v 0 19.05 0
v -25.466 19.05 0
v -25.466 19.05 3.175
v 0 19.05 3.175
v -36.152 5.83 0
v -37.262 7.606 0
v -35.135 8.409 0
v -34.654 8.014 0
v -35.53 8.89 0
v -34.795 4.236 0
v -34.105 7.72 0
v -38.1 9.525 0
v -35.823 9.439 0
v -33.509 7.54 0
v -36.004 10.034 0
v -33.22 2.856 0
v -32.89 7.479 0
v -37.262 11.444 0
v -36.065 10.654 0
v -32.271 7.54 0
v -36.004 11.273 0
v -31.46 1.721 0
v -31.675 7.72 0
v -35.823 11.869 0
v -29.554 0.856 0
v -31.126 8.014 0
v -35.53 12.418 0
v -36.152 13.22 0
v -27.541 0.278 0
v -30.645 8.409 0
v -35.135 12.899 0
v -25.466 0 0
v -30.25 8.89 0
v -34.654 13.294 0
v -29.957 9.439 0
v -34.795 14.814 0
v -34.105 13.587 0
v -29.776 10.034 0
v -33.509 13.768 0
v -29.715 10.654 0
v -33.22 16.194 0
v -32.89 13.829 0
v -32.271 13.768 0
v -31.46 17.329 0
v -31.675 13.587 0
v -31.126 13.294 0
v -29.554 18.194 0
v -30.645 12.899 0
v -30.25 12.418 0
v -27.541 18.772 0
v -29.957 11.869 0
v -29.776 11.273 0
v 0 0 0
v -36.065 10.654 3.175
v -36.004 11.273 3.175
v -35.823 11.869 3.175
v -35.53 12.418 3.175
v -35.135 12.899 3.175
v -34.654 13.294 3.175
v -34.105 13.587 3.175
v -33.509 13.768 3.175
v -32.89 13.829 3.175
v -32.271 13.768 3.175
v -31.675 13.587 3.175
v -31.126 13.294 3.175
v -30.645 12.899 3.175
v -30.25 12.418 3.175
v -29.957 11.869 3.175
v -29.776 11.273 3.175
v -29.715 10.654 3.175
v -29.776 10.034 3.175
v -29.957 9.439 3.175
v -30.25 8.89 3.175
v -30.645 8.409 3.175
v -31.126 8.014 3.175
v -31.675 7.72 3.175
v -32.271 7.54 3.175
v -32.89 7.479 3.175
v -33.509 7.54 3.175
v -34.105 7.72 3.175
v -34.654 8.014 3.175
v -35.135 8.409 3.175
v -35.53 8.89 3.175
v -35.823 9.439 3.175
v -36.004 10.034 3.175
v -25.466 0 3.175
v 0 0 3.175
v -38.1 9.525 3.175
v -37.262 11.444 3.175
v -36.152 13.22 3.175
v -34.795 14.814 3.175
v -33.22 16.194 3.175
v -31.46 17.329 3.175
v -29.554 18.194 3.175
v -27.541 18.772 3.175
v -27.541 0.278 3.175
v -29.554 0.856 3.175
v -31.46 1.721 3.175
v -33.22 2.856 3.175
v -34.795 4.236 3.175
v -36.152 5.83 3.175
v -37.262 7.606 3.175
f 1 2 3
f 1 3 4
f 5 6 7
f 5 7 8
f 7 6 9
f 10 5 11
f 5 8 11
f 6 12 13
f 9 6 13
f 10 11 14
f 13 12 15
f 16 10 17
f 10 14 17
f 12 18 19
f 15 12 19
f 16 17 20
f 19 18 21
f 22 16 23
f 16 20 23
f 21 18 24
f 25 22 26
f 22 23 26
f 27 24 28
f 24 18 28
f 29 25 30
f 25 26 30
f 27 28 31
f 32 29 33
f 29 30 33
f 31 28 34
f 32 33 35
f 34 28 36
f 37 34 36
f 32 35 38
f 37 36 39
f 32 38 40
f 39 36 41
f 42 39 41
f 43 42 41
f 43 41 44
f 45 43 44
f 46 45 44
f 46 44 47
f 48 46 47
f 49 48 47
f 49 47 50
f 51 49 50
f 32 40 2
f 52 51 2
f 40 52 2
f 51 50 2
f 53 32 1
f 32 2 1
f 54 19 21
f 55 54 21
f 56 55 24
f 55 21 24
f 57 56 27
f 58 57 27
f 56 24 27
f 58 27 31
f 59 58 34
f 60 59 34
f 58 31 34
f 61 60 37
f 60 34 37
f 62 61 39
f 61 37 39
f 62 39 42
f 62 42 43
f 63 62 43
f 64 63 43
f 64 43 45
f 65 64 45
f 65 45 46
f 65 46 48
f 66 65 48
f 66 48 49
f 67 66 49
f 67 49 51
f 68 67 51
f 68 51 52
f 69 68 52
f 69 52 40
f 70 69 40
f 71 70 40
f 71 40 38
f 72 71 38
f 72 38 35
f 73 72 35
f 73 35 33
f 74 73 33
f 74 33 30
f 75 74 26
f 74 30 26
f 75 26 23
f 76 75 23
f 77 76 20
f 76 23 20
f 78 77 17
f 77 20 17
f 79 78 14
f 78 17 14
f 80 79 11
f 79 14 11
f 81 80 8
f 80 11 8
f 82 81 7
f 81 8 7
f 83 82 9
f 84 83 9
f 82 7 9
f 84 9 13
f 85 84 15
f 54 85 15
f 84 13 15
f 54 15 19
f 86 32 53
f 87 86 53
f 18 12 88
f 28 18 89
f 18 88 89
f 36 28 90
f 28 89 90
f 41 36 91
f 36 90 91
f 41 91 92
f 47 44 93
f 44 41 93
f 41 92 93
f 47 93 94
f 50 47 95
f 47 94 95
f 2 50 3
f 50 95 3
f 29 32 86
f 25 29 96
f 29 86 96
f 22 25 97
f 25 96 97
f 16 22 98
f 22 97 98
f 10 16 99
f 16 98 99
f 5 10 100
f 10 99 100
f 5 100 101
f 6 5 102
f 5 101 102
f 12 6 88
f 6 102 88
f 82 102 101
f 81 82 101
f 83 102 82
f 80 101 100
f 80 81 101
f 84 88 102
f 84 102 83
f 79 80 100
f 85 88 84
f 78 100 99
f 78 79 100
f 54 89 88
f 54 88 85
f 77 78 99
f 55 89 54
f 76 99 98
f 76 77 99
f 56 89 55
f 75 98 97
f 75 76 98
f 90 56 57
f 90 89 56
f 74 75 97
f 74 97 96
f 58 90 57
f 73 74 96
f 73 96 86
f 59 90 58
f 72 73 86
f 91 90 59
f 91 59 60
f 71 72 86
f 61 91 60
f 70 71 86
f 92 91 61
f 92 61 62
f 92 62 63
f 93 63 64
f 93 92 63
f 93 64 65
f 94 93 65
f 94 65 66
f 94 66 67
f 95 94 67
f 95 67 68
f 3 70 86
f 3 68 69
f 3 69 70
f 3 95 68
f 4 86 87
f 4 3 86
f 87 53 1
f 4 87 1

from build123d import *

# Parameters (mm, degrees)
F0_W     = 38.1
F0_H     = 19.05
F1_DEPTH = 3.175
F3_DEPTH = 3.176
F5_D     = 6.35


with BuildPart() as f1:
    # F0 (on Top) → F1 (new body)
    with BuildSketch(Plane.XY):
        with Locations((-19.05, 9.525)):
            Rectangle(F0_W, F0_H)
    extrude(amount=F1_DEPTH)

    # F2 (on face) → F3 (cut, through all)
    with BuildSketch(Plane.XY.offset(3.175)):
        with BuildLine():
            ThreePointArc((-38.1, 9.525), (-33.220058, 16.193908), (-25.465647, 19.05))
            Line((-25.465647, 19.05), (-38.1, 19.05))
            Line((-38.1, 19.05), (-38.1, 9.525))
        make_face()
        with BuildLine():
            ThreePointArc((-25.465647, 0), (-33.220058, 2.856092), (-38.1, 9.525))
            Line((-38.1, 9.525), (-38.1, 0))
            Line((-38.1, 0), (-25.465647, 0))
        make_face()
    extrude(amount=-F3_DEPTH, mode=Mode.SUBTRACT)

    # F5 (through all)
    with Locations(Plane.XY.offset(3.175)):
        with Locations((-32.890055, 10.653644)):
            Hole(F5_D / 2)


solid = f1.part
